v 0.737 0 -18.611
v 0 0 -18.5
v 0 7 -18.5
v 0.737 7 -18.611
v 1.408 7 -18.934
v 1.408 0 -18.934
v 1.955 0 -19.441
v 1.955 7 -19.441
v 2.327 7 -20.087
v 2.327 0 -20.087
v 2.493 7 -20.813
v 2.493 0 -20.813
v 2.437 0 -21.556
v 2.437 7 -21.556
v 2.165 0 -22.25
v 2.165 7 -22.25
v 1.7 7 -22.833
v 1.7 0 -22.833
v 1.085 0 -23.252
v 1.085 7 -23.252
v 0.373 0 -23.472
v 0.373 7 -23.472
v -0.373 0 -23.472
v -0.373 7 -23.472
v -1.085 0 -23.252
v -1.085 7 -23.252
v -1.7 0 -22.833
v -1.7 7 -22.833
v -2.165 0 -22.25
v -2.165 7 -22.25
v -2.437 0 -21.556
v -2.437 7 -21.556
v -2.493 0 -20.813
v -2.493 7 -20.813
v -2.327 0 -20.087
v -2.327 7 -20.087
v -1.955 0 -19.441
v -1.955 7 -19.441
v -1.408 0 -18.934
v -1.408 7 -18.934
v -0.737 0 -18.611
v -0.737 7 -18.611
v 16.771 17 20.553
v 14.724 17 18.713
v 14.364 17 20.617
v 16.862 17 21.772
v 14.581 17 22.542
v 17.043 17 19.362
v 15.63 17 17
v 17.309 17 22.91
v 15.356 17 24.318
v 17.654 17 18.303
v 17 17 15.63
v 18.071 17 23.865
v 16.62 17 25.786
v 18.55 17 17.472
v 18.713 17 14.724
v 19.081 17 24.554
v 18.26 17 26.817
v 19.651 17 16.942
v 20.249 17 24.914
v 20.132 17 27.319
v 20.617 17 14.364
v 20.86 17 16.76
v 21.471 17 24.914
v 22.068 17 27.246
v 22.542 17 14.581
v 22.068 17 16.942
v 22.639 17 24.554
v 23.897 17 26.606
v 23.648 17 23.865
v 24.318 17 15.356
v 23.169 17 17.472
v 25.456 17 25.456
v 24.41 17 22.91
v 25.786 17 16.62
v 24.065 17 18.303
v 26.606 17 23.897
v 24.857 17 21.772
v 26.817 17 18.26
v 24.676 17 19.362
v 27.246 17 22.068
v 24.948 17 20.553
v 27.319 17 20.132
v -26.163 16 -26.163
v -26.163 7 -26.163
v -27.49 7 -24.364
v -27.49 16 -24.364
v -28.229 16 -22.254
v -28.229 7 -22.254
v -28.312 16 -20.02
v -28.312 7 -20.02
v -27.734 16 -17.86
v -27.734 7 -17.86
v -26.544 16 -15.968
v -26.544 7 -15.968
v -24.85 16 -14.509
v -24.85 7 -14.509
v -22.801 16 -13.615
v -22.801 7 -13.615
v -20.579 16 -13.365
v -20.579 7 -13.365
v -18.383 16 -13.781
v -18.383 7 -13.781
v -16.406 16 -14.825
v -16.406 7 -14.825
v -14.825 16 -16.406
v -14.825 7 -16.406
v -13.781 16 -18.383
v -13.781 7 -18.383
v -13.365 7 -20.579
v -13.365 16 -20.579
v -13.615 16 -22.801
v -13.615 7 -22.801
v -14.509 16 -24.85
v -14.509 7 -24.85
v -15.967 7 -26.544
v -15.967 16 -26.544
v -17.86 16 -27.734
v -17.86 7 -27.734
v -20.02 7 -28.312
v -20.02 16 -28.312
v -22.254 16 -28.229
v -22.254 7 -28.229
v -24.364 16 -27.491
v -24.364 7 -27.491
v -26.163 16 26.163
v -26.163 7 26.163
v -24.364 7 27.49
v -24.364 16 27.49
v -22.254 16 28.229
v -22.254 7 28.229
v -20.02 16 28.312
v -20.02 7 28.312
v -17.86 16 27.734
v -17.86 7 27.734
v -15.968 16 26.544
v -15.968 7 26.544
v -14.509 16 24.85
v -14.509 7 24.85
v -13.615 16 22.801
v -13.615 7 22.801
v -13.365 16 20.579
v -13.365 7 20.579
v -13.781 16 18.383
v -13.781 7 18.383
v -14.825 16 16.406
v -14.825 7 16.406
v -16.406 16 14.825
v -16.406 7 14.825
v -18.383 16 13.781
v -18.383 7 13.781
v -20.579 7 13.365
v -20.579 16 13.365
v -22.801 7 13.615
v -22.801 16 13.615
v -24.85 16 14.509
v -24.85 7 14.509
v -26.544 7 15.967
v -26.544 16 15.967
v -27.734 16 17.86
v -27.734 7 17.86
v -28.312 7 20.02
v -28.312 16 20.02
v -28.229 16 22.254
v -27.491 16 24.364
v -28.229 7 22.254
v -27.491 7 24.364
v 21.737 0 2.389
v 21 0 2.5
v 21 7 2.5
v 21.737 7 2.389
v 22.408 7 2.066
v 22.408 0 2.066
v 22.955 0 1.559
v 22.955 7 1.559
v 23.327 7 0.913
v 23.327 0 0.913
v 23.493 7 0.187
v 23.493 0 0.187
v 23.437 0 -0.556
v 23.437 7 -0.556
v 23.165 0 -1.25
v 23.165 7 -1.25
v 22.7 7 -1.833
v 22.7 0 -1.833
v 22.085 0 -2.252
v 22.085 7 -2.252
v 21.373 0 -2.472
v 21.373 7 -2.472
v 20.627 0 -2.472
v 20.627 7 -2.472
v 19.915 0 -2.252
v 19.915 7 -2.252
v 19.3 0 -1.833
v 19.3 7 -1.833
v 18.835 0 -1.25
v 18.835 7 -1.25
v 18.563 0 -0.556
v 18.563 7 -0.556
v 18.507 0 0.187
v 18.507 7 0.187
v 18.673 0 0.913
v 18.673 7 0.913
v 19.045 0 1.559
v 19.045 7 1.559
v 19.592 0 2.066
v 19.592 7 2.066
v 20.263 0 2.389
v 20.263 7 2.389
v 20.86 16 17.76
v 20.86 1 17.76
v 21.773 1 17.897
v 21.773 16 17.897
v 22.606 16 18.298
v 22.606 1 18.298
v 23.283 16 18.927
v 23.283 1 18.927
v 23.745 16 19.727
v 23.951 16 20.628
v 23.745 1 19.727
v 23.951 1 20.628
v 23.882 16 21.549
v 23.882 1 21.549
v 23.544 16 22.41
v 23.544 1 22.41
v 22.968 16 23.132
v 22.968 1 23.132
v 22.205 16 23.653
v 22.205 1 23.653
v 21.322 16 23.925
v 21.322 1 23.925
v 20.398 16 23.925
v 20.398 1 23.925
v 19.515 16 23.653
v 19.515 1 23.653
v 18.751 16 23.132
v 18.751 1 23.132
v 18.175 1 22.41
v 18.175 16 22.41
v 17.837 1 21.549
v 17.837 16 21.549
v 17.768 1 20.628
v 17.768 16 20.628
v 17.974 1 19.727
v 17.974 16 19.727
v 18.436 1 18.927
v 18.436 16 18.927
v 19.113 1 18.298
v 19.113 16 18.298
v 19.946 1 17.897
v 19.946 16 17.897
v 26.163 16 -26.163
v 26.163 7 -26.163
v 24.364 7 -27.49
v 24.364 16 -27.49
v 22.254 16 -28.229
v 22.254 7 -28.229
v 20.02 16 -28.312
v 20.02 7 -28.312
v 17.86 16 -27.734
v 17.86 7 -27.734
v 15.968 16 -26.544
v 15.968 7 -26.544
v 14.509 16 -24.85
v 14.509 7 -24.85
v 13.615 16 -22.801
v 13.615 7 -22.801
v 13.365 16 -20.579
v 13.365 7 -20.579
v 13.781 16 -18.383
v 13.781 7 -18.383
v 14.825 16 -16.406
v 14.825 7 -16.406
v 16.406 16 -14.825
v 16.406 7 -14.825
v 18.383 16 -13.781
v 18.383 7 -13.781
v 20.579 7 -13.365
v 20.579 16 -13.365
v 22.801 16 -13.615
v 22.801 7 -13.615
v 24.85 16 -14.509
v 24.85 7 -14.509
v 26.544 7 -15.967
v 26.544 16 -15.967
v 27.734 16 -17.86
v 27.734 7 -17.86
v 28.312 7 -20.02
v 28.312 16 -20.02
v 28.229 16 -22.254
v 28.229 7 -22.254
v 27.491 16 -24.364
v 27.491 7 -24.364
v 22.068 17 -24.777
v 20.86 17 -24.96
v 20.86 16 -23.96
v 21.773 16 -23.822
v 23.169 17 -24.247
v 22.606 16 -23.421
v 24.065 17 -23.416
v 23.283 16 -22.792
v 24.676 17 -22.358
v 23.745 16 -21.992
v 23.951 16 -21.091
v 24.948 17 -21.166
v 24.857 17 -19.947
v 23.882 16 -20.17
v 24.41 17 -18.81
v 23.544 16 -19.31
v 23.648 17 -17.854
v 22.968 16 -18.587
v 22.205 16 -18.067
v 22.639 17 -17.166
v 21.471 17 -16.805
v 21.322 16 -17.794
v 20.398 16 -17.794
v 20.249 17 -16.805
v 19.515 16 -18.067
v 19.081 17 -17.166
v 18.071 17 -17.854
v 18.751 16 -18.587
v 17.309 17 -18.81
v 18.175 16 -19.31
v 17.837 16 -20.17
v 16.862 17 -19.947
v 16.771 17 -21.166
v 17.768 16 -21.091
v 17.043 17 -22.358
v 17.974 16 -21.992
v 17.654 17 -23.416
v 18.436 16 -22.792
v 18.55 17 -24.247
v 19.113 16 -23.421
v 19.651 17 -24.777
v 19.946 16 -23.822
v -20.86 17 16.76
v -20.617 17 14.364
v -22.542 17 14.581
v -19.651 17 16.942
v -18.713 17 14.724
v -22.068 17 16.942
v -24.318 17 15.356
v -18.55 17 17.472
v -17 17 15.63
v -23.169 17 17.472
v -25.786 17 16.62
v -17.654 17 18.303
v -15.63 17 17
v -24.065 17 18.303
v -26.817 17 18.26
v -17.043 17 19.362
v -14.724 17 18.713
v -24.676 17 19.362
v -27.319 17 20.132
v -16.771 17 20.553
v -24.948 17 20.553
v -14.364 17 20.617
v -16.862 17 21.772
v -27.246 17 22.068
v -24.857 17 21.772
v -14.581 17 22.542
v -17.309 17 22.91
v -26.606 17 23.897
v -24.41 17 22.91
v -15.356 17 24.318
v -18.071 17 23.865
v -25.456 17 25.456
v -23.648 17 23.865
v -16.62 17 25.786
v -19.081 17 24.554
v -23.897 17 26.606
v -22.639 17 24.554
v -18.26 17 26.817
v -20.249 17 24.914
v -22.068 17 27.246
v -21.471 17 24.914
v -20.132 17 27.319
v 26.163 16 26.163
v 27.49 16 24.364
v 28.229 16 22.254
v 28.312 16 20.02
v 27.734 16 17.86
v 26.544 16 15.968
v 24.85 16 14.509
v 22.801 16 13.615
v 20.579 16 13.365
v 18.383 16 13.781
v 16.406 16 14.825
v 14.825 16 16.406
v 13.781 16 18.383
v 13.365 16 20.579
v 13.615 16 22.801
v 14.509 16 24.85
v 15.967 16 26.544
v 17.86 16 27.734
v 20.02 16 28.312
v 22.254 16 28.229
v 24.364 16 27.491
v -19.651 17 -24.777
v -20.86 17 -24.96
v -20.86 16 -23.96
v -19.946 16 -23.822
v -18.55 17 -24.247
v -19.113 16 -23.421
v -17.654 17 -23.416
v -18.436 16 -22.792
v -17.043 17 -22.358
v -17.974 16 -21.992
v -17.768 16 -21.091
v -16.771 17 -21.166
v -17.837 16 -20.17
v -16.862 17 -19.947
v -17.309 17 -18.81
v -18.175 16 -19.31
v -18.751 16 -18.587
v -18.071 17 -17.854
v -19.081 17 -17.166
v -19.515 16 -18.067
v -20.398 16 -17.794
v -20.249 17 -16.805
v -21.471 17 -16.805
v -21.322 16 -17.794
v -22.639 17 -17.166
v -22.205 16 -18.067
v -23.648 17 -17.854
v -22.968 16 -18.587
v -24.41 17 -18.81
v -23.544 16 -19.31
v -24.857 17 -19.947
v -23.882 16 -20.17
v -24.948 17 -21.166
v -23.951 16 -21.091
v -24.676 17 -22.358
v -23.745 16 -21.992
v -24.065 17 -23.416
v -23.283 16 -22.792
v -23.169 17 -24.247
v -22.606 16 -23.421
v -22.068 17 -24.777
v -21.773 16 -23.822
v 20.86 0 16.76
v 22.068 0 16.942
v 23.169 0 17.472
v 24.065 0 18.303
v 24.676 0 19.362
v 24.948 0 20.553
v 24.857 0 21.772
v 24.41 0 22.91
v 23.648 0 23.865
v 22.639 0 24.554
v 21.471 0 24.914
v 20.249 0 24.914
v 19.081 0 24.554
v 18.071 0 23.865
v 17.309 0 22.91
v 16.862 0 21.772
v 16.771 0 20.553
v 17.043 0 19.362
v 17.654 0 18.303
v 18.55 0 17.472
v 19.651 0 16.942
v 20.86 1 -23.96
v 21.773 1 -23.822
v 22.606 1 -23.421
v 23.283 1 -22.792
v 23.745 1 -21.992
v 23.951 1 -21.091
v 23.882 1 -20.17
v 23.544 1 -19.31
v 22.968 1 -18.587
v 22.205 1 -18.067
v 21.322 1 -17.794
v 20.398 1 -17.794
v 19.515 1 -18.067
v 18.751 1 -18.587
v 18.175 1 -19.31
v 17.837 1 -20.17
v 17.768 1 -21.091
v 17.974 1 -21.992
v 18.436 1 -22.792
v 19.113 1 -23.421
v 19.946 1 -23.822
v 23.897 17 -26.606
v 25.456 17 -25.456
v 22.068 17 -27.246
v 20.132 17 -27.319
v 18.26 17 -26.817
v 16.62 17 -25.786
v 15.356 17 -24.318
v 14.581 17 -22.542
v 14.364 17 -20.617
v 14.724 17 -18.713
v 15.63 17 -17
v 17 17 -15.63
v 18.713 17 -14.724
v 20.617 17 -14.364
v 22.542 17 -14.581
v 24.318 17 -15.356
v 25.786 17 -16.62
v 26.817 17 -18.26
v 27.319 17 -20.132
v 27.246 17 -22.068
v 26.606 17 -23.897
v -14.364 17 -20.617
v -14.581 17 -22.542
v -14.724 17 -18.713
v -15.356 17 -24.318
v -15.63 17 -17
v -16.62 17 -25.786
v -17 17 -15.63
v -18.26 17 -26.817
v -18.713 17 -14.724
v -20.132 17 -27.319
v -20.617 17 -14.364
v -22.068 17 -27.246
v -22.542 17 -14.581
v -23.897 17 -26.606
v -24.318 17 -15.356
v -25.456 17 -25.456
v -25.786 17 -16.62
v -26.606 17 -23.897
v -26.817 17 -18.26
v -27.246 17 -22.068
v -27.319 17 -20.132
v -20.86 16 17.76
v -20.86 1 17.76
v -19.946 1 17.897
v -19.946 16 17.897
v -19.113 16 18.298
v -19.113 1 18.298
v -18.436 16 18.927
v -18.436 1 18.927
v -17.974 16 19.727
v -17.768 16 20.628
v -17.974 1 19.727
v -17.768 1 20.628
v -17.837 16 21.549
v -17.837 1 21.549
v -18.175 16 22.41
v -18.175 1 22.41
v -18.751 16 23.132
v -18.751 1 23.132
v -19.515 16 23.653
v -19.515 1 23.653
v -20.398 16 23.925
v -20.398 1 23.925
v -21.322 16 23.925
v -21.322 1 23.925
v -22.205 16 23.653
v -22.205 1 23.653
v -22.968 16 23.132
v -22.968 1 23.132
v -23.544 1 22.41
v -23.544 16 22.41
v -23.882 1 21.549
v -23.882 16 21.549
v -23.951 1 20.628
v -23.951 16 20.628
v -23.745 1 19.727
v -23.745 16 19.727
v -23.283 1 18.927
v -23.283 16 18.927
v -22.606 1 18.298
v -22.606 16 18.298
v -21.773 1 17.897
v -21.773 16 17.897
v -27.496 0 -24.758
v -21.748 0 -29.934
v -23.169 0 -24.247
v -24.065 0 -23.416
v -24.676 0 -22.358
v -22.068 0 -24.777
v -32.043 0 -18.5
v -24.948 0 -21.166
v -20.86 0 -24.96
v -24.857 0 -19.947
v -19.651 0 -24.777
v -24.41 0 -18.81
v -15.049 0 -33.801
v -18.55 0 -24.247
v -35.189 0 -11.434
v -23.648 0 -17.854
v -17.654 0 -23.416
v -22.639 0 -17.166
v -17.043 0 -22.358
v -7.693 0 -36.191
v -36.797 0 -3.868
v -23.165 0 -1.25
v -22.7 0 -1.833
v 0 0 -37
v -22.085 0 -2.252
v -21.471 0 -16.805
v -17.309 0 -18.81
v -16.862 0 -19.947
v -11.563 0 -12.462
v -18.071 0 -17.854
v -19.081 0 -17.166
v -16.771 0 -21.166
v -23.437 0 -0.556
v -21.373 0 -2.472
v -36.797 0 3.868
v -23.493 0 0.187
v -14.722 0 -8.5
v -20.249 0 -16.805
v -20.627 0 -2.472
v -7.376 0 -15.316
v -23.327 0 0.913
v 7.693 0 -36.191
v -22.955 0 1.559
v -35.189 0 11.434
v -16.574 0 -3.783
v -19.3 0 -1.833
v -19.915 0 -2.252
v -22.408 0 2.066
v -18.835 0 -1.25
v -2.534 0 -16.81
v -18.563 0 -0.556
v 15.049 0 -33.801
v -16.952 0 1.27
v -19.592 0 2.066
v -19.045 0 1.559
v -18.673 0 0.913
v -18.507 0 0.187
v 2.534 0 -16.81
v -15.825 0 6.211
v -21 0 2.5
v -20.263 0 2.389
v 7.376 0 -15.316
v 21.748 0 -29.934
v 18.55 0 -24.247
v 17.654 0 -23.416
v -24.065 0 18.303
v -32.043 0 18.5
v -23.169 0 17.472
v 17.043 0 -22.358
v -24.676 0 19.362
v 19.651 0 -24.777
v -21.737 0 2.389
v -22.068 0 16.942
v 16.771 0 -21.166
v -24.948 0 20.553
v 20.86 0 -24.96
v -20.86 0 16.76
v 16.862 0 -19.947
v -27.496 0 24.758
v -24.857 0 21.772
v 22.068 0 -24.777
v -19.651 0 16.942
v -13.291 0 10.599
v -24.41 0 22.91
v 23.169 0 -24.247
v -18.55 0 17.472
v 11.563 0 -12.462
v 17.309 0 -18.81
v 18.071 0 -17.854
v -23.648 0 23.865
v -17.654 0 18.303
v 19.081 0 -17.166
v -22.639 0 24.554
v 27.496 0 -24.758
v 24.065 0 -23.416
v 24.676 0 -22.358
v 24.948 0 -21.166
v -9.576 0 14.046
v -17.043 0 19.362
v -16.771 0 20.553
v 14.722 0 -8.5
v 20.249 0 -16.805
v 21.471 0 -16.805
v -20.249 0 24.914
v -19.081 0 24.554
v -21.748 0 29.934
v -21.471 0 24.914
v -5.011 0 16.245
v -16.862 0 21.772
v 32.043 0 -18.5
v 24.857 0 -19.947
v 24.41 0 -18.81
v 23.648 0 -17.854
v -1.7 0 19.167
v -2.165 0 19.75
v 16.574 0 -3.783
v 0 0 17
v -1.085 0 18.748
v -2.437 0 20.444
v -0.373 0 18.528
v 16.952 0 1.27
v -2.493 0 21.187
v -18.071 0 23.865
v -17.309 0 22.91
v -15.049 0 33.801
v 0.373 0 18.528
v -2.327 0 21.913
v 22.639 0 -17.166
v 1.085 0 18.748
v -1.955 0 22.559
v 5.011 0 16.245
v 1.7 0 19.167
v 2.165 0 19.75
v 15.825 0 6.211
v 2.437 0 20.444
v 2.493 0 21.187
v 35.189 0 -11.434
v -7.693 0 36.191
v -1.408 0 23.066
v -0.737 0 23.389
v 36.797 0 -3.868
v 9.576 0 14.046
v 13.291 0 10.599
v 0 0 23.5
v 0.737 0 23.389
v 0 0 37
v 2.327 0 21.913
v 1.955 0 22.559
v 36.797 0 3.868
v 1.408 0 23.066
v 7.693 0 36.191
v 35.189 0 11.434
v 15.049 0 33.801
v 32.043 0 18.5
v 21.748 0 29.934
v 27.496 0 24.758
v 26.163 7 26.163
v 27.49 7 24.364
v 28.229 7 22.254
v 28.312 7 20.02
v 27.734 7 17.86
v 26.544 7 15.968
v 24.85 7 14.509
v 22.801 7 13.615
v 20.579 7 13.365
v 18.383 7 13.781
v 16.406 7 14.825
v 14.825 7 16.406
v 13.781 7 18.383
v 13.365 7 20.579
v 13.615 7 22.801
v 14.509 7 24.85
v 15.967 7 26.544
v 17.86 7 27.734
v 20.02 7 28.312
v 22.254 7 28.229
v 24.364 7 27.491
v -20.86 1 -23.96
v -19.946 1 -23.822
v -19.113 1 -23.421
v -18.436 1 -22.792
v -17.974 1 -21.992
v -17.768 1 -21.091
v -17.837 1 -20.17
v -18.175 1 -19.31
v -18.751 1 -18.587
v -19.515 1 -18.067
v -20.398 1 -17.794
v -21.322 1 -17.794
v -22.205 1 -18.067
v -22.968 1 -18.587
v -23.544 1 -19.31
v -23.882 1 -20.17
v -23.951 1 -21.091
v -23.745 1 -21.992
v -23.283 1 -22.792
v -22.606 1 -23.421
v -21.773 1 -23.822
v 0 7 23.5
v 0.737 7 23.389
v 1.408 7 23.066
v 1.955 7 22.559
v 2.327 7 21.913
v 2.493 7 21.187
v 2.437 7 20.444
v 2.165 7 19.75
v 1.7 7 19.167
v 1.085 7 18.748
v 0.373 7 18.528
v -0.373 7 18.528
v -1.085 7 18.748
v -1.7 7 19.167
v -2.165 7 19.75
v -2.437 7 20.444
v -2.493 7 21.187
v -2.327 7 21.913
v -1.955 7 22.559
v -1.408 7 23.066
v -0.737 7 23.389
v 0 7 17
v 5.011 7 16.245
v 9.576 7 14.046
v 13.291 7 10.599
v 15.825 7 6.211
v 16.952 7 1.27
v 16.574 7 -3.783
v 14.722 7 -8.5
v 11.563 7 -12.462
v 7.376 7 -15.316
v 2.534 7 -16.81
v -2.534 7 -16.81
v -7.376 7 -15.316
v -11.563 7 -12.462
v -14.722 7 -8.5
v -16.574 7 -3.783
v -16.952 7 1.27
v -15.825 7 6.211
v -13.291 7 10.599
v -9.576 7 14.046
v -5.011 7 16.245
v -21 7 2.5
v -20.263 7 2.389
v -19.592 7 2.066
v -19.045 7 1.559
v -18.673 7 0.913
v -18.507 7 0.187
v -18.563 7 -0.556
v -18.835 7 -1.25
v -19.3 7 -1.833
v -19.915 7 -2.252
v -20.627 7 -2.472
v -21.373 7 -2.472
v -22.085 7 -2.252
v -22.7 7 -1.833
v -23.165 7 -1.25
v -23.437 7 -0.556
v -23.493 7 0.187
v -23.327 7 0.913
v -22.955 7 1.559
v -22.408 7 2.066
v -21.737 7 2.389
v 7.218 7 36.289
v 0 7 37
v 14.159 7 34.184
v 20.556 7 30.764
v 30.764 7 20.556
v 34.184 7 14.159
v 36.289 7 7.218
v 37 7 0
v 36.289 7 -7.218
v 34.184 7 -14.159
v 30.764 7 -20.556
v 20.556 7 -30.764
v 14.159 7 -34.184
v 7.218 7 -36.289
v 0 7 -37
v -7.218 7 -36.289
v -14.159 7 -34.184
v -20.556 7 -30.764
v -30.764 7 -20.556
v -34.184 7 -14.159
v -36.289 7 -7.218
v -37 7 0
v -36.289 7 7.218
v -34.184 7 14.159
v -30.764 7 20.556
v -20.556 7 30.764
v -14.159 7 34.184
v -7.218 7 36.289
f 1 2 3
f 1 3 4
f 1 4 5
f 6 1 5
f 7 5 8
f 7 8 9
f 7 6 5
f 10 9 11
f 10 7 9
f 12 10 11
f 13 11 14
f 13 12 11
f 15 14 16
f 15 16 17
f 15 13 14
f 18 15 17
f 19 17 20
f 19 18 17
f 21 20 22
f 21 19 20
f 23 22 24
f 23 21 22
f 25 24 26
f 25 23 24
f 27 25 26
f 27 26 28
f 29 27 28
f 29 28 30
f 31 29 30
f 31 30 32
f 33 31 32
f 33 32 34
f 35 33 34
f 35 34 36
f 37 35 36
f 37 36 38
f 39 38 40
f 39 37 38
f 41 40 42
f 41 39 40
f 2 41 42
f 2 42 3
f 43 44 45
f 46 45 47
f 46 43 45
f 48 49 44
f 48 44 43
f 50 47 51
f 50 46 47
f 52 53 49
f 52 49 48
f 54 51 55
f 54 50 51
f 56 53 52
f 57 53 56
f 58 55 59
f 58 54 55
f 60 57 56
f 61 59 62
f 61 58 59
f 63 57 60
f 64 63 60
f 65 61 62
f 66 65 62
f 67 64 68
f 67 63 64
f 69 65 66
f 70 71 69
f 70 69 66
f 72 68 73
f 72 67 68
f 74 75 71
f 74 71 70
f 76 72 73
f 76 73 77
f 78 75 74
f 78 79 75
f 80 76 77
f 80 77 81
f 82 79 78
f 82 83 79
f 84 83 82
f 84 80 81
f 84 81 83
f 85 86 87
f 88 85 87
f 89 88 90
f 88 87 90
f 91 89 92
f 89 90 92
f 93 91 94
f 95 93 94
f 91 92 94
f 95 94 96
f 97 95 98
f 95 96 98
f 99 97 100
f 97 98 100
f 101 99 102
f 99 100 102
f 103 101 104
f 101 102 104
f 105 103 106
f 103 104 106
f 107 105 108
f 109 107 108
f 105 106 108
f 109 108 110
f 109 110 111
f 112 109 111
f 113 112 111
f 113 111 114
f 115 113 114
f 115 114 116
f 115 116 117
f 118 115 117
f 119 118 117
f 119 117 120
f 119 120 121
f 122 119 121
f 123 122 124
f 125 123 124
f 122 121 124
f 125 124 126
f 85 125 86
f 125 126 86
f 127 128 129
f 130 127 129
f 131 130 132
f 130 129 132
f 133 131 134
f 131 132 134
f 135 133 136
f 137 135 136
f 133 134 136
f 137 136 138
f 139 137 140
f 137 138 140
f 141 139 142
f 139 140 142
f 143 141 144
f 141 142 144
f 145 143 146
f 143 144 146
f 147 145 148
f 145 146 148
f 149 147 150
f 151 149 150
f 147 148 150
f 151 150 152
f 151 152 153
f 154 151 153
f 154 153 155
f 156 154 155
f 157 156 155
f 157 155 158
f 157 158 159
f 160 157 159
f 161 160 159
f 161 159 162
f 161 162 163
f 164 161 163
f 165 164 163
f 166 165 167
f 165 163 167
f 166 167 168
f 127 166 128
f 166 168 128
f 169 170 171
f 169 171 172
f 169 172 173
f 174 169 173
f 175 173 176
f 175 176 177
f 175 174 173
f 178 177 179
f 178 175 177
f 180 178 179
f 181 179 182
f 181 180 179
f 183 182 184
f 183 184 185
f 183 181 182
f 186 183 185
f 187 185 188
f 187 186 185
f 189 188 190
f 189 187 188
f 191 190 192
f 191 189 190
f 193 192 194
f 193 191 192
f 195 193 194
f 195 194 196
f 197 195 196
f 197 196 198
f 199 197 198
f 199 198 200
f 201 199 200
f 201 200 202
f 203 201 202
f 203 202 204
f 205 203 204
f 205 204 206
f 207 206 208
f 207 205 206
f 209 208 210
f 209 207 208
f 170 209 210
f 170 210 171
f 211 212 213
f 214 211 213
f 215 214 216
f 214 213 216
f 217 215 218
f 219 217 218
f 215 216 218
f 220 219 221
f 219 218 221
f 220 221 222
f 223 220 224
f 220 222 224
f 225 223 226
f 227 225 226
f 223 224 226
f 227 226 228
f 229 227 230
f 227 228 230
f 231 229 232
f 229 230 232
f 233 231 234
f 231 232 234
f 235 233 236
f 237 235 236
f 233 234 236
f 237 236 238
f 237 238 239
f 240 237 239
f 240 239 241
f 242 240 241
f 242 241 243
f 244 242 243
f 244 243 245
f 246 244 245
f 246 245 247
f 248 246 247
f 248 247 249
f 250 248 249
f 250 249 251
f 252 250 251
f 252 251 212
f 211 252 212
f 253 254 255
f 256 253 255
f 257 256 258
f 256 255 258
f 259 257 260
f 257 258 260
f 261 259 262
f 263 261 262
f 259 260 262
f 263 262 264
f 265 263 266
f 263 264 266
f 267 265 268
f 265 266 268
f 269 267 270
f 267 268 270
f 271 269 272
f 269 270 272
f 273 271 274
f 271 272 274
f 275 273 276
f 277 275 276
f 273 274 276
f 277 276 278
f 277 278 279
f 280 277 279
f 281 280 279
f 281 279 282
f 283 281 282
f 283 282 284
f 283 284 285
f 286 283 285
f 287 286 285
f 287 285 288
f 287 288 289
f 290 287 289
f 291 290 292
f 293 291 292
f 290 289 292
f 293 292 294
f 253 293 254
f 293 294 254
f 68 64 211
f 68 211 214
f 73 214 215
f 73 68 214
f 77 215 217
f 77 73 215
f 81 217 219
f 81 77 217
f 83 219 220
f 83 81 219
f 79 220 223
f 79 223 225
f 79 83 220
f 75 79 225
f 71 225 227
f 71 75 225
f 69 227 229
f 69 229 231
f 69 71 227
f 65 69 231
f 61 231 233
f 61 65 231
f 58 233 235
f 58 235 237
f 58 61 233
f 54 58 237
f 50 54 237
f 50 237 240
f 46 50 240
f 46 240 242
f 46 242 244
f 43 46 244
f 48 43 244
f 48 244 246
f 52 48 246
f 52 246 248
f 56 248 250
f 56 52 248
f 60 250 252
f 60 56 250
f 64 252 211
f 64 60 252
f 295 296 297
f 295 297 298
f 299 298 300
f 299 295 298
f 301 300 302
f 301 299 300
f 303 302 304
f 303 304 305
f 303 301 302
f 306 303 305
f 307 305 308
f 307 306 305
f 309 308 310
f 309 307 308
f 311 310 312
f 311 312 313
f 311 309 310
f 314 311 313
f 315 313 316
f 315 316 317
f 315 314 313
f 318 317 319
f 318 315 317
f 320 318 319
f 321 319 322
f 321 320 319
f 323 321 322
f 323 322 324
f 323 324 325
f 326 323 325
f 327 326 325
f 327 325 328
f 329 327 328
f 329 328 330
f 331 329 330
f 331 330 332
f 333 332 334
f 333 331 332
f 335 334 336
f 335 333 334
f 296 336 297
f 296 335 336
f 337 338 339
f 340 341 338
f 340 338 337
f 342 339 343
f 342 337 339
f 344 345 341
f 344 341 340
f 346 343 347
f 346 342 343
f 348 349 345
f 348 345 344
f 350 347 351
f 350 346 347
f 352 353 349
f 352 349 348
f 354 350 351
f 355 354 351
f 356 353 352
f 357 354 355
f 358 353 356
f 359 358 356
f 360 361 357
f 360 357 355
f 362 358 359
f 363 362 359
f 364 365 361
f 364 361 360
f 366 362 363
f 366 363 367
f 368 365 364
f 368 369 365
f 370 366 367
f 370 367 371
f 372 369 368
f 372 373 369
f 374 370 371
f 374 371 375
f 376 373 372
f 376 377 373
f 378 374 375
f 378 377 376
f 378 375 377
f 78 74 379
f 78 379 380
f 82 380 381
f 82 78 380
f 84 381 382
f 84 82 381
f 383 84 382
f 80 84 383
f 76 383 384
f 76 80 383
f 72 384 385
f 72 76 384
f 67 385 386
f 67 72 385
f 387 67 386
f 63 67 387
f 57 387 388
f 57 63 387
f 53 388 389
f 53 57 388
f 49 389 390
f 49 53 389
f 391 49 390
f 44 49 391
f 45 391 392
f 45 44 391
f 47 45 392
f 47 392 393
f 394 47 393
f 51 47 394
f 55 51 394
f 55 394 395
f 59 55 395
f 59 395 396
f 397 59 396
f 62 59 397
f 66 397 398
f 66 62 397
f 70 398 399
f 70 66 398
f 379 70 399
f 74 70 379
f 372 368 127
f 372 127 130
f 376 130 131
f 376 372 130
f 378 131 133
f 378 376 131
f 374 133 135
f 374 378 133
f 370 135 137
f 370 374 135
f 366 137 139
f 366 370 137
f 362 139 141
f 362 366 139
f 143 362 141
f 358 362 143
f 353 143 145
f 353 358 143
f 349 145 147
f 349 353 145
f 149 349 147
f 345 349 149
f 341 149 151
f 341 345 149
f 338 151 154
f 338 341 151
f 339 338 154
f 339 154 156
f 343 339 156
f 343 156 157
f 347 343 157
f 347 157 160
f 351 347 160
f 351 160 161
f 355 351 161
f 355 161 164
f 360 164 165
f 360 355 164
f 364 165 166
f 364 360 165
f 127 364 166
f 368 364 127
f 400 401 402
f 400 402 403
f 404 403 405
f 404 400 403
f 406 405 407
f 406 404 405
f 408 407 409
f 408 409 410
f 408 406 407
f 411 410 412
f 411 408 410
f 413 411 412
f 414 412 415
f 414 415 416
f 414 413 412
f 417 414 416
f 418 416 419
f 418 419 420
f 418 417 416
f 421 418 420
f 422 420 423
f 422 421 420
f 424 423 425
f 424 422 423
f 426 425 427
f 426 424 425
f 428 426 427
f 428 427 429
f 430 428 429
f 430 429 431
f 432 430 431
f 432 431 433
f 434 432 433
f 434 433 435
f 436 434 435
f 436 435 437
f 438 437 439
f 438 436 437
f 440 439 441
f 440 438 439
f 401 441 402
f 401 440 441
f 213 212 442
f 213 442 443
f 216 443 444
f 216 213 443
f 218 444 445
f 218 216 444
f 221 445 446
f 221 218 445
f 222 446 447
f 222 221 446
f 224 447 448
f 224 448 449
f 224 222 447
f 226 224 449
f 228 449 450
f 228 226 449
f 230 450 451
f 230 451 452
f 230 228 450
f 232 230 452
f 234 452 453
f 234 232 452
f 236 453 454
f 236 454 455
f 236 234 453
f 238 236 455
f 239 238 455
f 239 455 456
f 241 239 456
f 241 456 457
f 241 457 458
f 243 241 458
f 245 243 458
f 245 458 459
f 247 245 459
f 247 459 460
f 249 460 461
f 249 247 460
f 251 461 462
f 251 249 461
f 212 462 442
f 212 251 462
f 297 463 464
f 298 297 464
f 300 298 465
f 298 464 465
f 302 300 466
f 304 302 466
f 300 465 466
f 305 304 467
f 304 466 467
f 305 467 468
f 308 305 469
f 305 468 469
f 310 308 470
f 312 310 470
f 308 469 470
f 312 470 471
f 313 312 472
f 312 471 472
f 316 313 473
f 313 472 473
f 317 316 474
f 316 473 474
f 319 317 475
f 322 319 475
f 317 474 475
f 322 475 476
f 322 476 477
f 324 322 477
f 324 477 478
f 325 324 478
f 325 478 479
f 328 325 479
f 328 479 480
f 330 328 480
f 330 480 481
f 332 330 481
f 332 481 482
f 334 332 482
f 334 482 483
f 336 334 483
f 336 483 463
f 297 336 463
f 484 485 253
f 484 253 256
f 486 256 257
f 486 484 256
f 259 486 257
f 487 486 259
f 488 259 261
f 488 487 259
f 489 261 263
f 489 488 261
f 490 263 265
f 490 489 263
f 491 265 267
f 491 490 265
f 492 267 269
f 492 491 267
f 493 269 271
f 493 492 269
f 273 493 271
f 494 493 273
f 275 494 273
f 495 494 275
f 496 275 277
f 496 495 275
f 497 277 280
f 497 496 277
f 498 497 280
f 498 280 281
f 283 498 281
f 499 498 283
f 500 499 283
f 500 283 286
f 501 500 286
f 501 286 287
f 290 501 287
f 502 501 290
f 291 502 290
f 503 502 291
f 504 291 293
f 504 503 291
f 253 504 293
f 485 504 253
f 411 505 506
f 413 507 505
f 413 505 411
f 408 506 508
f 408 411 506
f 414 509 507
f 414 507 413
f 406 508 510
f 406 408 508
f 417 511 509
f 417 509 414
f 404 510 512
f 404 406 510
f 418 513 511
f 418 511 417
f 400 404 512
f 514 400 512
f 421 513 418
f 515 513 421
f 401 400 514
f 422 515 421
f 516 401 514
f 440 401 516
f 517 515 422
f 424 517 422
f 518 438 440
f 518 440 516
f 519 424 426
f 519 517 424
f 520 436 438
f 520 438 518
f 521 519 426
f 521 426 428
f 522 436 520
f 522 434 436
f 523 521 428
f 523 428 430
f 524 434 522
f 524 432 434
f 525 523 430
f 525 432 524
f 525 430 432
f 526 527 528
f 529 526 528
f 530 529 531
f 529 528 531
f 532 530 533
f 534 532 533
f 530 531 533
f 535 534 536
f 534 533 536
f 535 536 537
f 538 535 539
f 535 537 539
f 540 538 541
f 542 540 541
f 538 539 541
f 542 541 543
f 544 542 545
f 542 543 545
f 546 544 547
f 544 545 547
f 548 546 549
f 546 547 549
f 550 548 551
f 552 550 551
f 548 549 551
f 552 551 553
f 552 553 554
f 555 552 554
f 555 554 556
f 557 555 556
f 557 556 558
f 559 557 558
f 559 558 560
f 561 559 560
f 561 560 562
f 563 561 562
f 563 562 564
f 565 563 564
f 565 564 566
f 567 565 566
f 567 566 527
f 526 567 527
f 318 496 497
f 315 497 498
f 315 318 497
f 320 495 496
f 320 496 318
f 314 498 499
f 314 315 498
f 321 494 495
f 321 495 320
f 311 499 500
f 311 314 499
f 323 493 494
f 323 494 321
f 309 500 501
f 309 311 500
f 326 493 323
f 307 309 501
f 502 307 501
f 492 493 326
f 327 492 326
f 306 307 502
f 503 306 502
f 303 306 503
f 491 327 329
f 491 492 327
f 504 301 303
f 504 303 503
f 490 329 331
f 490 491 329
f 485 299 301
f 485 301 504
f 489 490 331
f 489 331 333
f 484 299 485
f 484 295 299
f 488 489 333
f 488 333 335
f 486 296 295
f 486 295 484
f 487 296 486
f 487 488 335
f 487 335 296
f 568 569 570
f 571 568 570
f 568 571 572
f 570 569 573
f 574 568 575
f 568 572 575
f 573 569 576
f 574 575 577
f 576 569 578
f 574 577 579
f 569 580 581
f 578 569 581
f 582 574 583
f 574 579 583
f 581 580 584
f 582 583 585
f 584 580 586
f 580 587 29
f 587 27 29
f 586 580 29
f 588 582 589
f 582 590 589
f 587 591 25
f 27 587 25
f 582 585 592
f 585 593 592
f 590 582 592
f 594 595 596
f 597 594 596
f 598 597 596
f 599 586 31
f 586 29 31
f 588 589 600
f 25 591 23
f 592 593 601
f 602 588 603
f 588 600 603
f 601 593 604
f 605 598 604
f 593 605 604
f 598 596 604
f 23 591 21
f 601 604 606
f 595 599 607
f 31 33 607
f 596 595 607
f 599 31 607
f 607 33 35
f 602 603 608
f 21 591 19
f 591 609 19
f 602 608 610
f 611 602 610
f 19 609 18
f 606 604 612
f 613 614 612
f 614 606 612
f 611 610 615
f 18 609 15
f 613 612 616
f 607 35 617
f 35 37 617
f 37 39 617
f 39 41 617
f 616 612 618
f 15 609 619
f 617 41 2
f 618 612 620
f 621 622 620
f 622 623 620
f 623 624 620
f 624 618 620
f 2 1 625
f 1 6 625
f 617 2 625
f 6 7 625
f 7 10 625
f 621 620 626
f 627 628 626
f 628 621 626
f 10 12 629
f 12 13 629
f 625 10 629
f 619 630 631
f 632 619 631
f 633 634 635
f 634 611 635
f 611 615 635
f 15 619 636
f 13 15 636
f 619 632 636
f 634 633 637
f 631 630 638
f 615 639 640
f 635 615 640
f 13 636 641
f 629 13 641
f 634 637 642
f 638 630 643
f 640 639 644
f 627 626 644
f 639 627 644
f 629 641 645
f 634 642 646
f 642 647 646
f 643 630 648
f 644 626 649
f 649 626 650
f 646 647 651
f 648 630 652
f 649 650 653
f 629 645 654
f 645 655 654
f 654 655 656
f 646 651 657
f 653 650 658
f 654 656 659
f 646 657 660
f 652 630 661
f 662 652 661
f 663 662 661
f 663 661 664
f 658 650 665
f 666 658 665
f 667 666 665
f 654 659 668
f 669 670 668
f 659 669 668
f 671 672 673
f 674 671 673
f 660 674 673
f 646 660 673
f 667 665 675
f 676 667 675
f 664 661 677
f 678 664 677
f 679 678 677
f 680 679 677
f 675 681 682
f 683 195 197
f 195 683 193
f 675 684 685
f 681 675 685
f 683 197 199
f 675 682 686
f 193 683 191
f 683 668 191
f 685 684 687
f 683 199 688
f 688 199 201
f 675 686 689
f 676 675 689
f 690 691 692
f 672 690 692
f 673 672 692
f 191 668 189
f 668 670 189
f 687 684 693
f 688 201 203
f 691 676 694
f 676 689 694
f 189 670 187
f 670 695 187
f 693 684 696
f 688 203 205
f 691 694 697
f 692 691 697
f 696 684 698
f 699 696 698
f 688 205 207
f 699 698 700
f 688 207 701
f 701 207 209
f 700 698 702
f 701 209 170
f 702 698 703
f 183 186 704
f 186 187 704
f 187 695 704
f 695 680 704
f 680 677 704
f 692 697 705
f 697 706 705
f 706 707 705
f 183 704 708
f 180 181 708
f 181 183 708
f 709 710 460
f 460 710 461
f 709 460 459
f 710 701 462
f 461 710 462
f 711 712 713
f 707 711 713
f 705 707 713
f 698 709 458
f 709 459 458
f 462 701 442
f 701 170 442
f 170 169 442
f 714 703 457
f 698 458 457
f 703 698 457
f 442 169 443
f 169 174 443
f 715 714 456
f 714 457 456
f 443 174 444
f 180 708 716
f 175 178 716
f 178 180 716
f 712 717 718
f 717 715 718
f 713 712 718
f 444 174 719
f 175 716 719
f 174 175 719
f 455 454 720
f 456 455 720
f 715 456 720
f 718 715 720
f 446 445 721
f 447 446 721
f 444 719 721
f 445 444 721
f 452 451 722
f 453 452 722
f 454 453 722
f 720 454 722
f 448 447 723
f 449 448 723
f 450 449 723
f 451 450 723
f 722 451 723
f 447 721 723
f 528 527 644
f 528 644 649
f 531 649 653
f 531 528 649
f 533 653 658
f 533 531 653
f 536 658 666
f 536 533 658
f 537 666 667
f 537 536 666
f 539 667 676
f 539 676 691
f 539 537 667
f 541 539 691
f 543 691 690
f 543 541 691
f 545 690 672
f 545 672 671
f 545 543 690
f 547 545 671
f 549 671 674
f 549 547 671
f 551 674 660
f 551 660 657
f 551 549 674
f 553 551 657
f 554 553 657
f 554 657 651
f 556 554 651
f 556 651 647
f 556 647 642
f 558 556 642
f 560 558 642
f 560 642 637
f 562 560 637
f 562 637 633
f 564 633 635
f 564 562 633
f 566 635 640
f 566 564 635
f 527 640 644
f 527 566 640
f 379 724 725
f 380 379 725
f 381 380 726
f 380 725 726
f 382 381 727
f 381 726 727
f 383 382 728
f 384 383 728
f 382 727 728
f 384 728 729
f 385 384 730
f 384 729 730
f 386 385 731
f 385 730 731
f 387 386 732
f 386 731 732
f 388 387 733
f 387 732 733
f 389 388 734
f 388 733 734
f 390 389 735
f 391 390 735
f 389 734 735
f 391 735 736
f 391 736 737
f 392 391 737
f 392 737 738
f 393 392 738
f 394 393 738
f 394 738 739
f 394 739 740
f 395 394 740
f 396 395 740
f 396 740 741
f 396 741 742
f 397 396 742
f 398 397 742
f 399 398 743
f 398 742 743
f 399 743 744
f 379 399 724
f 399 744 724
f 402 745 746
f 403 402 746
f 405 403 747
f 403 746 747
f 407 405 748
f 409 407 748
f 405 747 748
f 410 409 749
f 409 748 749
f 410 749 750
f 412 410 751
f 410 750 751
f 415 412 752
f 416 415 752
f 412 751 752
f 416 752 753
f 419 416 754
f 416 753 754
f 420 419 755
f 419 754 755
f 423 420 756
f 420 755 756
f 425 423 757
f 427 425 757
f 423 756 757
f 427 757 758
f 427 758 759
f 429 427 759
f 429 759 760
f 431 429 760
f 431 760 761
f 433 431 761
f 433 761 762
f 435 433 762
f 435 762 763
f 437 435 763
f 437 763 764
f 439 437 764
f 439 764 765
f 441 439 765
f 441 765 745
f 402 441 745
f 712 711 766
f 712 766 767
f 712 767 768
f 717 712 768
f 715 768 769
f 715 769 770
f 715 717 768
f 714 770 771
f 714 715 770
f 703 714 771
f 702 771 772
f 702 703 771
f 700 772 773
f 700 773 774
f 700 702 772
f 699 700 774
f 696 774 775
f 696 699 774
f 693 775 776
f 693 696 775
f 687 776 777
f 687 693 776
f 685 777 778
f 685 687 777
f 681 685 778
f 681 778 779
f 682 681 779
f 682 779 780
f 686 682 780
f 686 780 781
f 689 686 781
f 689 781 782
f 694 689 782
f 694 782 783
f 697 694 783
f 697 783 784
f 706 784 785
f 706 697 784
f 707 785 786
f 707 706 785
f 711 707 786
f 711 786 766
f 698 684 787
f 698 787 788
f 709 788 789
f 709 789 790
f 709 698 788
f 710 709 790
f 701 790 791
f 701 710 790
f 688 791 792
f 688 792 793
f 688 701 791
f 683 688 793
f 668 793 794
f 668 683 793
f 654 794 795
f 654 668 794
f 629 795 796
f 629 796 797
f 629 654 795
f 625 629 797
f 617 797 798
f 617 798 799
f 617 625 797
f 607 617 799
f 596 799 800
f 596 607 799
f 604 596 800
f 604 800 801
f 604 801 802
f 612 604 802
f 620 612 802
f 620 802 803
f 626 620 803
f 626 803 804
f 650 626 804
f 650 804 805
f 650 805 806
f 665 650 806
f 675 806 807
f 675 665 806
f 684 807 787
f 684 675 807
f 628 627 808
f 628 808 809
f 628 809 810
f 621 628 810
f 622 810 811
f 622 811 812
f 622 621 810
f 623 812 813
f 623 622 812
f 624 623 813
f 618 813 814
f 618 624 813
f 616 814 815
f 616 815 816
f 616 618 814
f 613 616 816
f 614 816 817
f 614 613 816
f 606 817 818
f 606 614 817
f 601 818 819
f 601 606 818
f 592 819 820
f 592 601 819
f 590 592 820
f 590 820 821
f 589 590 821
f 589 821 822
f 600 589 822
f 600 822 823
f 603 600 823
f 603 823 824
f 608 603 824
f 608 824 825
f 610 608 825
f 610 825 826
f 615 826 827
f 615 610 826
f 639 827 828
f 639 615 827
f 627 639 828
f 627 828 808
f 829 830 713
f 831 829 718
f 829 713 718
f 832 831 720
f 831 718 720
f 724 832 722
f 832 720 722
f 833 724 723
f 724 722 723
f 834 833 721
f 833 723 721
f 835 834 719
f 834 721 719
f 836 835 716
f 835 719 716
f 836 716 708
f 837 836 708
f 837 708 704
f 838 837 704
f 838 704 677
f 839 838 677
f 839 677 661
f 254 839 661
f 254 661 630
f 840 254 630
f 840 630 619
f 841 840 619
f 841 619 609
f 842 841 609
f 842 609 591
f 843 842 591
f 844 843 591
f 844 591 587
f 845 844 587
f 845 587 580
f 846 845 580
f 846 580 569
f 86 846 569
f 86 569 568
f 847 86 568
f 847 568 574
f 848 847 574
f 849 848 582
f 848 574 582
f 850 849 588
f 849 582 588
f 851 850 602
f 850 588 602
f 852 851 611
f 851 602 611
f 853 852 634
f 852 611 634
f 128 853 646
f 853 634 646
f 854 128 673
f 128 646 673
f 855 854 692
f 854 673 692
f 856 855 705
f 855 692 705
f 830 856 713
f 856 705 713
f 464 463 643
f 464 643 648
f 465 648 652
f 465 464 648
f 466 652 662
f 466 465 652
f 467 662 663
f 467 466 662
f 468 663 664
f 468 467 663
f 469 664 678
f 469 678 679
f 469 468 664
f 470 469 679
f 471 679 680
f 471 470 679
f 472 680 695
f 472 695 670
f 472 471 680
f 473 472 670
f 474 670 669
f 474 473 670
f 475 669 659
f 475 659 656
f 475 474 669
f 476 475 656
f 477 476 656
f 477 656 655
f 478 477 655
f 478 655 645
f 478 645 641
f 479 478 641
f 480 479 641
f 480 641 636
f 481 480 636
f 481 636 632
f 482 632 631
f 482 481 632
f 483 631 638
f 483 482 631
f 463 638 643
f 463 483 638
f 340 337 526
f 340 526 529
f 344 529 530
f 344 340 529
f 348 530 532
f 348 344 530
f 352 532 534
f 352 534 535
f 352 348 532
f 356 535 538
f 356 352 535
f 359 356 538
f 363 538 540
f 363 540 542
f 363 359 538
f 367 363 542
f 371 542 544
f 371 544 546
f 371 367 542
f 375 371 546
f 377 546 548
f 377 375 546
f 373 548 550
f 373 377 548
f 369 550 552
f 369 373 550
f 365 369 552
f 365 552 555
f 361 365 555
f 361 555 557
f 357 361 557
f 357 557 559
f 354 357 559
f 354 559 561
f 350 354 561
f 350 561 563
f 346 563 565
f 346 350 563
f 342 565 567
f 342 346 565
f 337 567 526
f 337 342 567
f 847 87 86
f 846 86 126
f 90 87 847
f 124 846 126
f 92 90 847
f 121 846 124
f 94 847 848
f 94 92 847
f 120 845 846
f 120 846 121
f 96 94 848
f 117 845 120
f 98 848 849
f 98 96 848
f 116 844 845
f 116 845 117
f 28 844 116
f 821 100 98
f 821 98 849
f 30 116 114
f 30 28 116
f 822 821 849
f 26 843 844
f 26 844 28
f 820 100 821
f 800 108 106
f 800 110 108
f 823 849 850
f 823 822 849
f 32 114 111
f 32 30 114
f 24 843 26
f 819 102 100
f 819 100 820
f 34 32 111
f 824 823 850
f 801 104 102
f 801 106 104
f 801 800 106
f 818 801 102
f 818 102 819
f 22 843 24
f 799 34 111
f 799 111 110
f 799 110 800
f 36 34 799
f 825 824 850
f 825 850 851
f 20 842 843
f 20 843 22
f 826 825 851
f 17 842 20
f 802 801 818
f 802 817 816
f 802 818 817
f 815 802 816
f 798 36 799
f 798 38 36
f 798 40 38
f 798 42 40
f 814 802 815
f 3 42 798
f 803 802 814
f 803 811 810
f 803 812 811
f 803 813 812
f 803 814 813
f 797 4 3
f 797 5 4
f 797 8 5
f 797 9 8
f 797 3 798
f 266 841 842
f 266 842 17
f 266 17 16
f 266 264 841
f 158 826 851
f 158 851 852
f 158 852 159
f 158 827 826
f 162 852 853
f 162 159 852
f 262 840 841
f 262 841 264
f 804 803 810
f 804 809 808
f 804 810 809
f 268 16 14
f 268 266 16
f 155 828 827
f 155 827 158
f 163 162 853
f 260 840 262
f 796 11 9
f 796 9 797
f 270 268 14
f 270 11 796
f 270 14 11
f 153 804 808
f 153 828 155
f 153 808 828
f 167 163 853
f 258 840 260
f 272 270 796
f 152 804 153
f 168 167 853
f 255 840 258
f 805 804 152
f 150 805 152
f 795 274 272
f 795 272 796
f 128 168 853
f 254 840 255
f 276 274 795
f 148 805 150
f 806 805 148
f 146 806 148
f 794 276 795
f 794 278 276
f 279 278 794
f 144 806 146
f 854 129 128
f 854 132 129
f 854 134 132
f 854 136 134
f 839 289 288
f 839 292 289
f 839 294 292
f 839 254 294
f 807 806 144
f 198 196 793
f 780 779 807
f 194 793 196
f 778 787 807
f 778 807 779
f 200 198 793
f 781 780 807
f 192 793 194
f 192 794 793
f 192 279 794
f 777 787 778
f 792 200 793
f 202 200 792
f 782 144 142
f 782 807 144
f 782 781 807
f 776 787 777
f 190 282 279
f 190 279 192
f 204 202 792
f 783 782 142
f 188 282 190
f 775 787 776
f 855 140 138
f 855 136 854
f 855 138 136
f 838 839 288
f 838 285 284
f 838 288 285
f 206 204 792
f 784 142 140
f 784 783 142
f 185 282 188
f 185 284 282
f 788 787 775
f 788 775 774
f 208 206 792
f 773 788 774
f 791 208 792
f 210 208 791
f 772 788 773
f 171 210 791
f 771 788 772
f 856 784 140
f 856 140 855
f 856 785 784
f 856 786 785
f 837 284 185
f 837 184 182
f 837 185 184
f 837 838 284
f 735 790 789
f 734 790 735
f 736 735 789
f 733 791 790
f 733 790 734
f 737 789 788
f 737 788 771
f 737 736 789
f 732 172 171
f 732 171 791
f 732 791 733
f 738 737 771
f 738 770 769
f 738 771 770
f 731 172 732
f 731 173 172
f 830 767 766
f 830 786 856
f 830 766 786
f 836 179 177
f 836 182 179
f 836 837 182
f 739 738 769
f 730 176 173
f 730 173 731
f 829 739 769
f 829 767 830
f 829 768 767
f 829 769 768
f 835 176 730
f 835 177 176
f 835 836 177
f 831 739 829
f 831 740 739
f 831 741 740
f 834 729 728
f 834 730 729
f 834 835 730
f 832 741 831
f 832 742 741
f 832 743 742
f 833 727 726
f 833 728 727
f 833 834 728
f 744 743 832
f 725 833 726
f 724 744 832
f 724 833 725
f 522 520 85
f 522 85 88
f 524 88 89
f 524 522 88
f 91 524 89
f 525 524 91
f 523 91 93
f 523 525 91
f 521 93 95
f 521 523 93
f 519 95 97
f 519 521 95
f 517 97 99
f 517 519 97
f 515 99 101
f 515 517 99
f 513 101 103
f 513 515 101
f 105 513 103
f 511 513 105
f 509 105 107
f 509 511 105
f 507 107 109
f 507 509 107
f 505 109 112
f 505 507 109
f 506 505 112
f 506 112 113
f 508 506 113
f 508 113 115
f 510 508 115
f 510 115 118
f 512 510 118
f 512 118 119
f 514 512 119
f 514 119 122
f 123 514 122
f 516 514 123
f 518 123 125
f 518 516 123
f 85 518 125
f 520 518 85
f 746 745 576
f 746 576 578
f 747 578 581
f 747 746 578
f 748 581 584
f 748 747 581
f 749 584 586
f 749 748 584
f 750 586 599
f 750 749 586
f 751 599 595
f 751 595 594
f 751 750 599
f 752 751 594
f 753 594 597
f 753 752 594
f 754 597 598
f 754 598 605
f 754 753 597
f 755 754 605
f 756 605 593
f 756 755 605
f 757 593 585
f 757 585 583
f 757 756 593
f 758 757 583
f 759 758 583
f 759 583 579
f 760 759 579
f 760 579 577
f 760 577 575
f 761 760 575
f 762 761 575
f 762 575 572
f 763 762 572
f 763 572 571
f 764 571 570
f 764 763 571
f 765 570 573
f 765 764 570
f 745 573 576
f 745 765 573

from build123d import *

# Parameters (mm, degrees)
SKETCH_1_R          = 37
SKETCH_1_R_2        = 2.5
SKETCH_1_R_3        = 17
EXTRUDE_1_DEPTH     = 7
SKETCH_4_R          = 7.5
EXTRUDE_9_DEPTH     = 10
CUT_EXTRUDE_1_REACH = 57.018
SKETCH_2_R          = 3.1
CHAMFER_1_SIZE      = 1


with BuildPart() as part:
    # 草图1 → 凸台-拉伸1 (new body)
    with BuildSketch(Plane(origin=(0, 0, 0), x_dir=(1, 0, 0), z_dir=(0, 1, 0))):
        with Locations(Location((0, 0, 0), (0, 0, 270))):
            Circle(SKETCH_1_R)
        with Locations(Location((21, 0, 0), (0, 0, 270))):
            Circle(SKETCH_1_R_2, mode=Mode.SUBTRACT)
        with Locations(Location((0, -21, 0), (0, 0, 270))):
            Circle(SKETCH_1_R_2, mode=Mode.SUBTRACT)
        with Locations(Location((-21, 0, 0), (0, 0, 270))):
            Circle(SKETCH_1_R_2, mode=Mode.SUBTRACT)
        with Locations(Location((0, 21, 0), (0, 0, 270))):
            Circle(SKETCH_1_R_2, mode=Mode.SUBTRACT)
        with Locations(Location((0, 0, 0), (0, 0, 270))):
            Circle(SKETCH_1_R_3, mode=Mode.SUBTRACT)
    extrude(amount=EXTRUDE_1_DEPTH)

    # 草图4 → 凸台-拉伸9 (add)
    with BuildSketch(Plane(origin=(0, 7, 0), x_dir=(1, 0, 0), z_dir=(0, 1, 0))):
        with Locations(Location((20.859650045, -20.859650045, 0), (0, 0, 314.999668768))):
            Circle(SKETCH_4_R)
        with Locations(Location((-20.859650045, -20.859650045, 0), (0, 0, 224.999668649))):
            Circle(SKETCH_4_R)
        with Locations(Location((-20.859650045, 20.859650045, 0), (0, 0, 134.999668649))):
            Circle(SKETCH_4_R)
        with Locations(Location((20.859650045, 20.859650045, 0), (0, 0, 44.999668649))):
            Circle(SKETCH_4_R)
    extrude(amount=EXTRUDE_9_DEPTH)

    # 草图2 → 切除-拉伸1 (cut, up to next)
    with BuildSketch(Plane.XZ, mode=Mode.PRIVATE) as cut_extrude_1_sk1:
        with Locations(Location((20.859650045, 20.859650045, 0), (0, 0, 270))):
            Circle(SKETCH_2_R)
    cut_extrude_1_tool1 = extrude(cut_extrude_1_sk1.sketch, amount=-CUT_EXTRUDE_1_REACH, mode=Mode.PRIVATE) & part.part
    # 草图2 → 切除-拉伸1 (cut, up to next)
    with BuildSketch(Plane.XZ, mode=Mode.PRIVATE) as cut_extrude_1_sk2:
        with Locations(Location((20.859650045, -20.859650045, 0), (0, 0, 270))):
            Circle(SKETCH_2_R)
    cut_extrude_1_tool2 = extrude(cut_extrude_1_sk2.sketch, amount=-CUT_EXTRUDE_1_REACH, mode=Mode.PRIVATE) & part.part
    # 草图2 → 切除-拉伸1 (cut, up to next)
    with BuildSketch(Plane.XZ, mode=Mode.PRIVATE) as cut_extrude_1_sk3:
        with Locations(Location((-20.859650045, -20.859650045, 0), (0, 0, 270))):
            Circle(SKETCH_2_R)
    cut_extrude_1_tool3 = extrude(cut_extrude_1_sk3.sketch, amount=-CUT_EXTRUDE_1_REACH, mode=Mode.PRIVATE) & part.part
    # 草图2 → 切除-拉伸1 (cut, up to next)
    with BuildSketch(Plane.XZ, mode=Mode.PRIVATE) as cut_extrude_1_sk4:
        with Locations(Location((-20.859650045, 20.859650045, 0), (0, 0, 270))):
            Circle(SKETCH_2_R)
    cut_extrude_1_tool4 = extrude(cut_extrude_1_sk4.sketch, amount=-CUT_EXTRUDE_1_REACH, mode=Mode.PRIVATE) & part.part
    add(cut_extrude_1_tool1.solids().sort_by_distance((20.85965, 0, 20.85965))[0], mode=Mode.SUBTRACT)
    add(cut_extrude_1_tool2.solids().sort_by_distance((20.85965, 0, -20.85965))[0], mode=Mode.SUBTRACT)
    add(cut_extrude_1_tool3.solids().sort_by_distance((-20.85965, 0, -20.85965))[0], mode=Mode.SUBTRACT)
    add(cut_extrude_1_tool4.solids().sort_by_distance((-20.85965, 0, 20.85965))[0], mode=Mode.SUBTRACT)

    # 倒角1
    chamfer_1_edges = [part.edges().sort_by_distance(p)[0] for p in [
        (15.556379845, 17, 15.556318527),
        (-15.556318516, 17, 15.556379856),
        (-15.556379856, 17, -15.556318516),
        (15.556318516, 17, -15.556379856),
        (-20.859650045, 17, 23.959650045),
        (-20.859650045, 0, 23.959650045),
        (-20.859650045, 17, -17.759650045),
        (-20.859650045, 0, -17.759650045),
        (20.859650045, 17, -17.759650045),
        (20.859650045, 0, -17.759650045),
        (20.859650045, 17, 23.959650045),
        (20.859650045, 0, 23.959650045),
    ]]
    chamfer(chamfer_1_edges, length=CHAMFER_1_SIZE)


solid = part.part
